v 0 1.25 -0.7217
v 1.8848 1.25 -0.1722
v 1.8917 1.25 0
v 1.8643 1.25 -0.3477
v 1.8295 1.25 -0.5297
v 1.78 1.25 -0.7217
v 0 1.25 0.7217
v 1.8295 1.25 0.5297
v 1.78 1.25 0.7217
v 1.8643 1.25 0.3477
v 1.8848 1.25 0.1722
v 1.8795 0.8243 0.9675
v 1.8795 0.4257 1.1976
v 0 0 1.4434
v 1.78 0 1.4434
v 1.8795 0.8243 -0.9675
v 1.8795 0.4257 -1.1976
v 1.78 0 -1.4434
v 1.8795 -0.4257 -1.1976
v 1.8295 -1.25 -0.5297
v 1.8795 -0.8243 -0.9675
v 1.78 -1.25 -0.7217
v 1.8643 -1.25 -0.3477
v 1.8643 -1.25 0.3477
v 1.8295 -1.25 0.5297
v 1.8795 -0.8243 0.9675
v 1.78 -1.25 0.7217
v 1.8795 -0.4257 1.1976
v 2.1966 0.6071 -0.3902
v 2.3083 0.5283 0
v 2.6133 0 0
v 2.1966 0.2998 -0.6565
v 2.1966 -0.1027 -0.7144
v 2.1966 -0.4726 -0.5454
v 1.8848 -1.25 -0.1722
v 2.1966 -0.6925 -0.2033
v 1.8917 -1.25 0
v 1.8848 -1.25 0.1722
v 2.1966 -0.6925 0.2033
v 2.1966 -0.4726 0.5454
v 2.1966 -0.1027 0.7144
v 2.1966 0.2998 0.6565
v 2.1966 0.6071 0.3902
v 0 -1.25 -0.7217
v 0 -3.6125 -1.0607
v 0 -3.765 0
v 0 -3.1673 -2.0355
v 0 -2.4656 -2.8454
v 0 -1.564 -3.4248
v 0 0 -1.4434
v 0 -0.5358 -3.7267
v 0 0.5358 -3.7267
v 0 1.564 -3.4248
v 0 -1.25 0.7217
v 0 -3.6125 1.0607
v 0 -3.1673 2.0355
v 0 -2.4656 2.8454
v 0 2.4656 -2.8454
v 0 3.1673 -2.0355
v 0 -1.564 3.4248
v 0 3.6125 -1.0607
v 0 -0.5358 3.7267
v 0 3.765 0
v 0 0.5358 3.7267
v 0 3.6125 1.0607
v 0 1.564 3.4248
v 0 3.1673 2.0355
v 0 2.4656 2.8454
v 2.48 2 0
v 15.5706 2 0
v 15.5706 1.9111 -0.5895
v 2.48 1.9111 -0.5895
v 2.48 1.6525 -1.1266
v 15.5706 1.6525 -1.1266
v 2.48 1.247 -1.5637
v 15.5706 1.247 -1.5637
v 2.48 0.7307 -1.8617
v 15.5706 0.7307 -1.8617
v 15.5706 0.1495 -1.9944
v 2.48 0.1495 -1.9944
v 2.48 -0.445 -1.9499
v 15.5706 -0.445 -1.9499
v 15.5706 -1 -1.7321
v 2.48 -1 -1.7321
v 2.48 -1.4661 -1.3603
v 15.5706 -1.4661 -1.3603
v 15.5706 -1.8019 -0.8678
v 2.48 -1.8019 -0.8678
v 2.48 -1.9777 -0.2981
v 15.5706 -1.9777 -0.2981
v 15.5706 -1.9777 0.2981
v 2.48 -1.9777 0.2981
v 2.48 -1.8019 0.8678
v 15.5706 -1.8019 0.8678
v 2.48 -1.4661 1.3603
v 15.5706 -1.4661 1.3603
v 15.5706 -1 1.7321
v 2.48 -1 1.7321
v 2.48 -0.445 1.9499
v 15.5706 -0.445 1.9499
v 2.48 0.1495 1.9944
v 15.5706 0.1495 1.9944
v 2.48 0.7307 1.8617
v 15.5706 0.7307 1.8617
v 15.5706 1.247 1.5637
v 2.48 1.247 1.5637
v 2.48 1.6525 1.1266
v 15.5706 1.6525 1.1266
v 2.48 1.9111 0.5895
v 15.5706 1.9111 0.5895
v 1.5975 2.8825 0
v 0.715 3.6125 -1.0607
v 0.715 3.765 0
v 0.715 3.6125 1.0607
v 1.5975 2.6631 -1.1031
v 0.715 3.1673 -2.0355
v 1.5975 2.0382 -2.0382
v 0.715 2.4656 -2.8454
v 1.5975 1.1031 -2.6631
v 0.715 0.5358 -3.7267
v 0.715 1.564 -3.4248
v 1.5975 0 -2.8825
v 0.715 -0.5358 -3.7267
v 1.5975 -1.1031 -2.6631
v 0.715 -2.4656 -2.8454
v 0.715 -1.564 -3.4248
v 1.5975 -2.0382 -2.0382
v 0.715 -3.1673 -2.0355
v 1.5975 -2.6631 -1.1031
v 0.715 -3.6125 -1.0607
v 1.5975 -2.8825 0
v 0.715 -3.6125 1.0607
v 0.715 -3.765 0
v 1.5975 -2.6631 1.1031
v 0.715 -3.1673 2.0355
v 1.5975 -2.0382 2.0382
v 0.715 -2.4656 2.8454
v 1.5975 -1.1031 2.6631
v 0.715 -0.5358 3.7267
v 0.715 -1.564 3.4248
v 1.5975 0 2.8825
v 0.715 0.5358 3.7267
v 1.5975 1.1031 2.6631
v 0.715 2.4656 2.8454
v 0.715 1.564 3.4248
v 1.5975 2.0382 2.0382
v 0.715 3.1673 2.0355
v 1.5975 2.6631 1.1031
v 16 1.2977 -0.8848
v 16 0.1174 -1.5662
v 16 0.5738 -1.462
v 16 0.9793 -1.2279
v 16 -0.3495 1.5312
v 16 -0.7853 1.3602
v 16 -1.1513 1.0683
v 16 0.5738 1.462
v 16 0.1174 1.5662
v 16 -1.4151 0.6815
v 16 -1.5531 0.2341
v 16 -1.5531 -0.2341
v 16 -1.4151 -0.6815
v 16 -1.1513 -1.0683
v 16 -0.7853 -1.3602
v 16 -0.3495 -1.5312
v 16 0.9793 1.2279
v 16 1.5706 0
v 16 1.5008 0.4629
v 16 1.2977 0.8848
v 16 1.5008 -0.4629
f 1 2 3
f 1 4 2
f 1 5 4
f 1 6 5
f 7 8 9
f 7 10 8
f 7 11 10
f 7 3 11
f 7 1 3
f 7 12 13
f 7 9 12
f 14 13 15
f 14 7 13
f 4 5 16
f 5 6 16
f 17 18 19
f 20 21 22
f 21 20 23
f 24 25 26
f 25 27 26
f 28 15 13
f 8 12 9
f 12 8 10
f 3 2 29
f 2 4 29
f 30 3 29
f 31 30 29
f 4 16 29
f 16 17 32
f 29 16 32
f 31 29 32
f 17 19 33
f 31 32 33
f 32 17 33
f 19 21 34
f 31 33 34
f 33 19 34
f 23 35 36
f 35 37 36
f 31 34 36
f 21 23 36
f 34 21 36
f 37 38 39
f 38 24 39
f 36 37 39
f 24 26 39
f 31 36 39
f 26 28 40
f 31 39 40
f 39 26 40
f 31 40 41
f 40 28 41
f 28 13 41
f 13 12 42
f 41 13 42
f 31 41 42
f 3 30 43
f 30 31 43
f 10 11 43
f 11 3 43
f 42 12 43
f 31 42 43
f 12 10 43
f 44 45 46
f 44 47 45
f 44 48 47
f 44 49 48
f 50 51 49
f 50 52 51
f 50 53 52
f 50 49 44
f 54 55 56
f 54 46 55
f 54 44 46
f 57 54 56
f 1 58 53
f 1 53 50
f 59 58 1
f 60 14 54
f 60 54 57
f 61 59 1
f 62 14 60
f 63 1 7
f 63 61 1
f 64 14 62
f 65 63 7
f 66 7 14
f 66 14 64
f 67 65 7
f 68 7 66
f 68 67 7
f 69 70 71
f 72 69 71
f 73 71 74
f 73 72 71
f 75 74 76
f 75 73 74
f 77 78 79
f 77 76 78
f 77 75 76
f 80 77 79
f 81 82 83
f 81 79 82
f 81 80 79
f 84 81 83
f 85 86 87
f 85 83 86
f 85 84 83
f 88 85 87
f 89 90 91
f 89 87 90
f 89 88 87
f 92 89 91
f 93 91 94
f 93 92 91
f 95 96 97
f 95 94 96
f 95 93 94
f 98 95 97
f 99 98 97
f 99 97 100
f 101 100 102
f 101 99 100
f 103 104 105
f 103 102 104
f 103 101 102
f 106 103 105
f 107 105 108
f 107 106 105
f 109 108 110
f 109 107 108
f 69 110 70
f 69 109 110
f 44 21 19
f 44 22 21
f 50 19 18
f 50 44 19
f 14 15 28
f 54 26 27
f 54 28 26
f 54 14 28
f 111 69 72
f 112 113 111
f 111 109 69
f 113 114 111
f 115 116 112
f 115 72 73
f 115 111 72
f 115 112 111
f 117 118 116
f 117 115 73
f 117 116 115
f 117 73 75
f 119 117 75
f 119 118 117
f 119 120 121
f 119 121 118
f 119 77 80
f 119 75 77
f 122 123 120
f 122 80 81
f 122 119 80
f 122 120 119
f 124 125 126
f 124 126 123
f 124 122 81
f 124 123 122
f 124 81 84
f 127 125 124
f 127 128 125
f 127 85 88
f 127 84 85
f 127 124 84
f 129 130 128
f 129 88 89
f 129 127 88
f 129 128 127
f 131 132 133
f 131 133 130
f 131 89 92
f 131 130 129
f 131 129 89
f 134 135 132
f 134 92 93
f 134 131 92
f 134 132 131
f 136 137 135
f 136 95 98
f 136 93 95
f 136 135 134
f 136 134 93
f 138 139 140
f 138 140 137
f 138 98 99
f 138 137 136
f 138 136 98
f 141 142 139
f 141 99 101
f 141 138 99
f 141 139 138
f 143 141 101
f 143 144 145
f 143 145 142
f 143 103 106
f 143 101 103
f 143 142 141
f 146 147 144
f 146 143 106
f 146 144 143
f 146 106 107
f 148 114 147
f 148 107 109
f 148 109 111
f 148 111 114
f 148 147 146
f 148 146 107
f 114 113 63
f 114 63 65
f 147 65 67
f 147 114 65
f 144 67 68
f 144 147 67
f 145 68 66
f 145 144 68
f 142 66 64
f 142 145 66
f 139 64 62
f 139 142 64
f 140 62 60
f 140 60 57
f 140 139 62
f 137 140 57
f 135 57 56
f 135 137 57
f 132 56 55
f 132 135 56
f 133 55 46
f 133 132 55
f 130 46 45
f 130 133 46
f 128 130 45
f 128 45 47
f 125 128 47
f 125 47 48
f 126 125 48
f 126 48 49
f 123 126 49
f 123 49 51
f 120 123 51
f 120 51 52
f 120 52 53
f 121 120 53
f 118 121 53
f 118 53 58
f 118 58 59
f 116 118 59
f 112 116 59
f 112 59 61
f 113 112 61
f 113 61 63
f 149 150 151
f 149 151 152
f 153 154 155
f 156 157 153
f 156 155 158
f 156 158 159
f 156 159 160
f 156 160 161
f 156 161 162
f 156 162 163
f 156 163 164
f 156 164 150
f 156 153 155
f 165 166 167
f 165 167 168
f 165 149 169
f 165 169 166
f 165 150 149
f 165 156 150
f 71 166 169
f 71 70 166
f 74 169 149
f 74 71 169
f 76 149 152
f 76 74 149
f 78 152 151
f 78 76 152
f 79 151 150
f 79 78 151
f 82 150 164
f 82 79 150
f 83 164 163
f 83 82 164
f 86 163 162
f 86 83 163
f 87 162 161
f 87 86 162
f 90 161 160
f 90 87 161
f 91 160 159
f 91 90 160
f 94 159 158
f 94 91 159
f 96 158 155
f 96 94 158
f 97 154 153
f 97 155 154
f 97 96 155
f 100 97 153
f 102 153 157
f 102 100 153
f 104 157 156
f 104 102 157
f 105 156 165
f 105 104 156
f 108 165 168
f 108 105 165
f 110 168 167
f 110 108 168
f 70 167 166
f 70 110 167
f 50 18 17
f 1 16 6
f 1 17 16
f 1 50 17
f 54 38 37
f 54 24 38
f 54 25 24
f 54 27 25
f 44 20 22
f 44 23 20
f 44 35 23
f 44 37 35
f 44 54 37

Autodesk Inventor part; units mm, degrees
ref_plane "YZ Plane" through (0, 0, 0) normal (1, 0, 0) x (0, 1, 0)
ref_plane "XZ Plane" through (0, 0, 0) normal (0, 1, 0) x (-1, 0, 0)
sketch "Sketch1" plane through (0, 0, 0) normal (0, 0, 1) x (1, 0, 0)
  line L0 (16, 0) -> (16, 2)
  line L1 (16, 2) -> (5, 2)
  line L2 (5, 2) -> (4.5706, 2)
  line L3 (0, 3.765) -> (0, 1.4434)
  line L4 (0, 1.4434) -> (1.78, 1.4434)
  line L5 (1.78, 1.4434) -> (2.6133, 0)
  line L6 (2.6133, 0) -> (16, 0)
  line L7 (0, 3.765) -> (0.715, 3.765)
  line L8 (0.715, 3.765) -> (2.48, 2)
  line L9 (4.5706, 2) -> (2.48, 2)
  line L10 (5, 2) -> (2.48, 2) construction
  line L11 (2.48, 2) -> (2.48, 2)
  line L12 (-3.2, 0) -> (19.2, 0) projected
  line L13 (0, -0.753) -> (0, 4.518) projected
  dimension "d0" = 16
  dimension "d1" = 11
  dimension "d2" = 1.78
  dimension "d3" = 4
  dimension "d6" = 2.48
  dimension "d7" = 45
  dimension "d8" = 2.8868
  dimension "d9" = 60
  dimension "d10" = 7.53
  dimension "d11" = 4
  dimension "d12" = 0.4294
revolve "Body" add sketch "Sketch1" angle 360 about axis through (2.6133, 0, 0) along (1, 0, 0) contours L6 L5 L4 L3 L7 L8 L9 L2 L1 L0
sketch "Sketch2" plane through (0, 0, 0) normal (-1, 0, 0) x (0, 0, 1)
  circle A0 centre (0, 0) radius 1.4434 projected
  line L0 (0, -5.271) -> (0, 5.271) projected
  line L1 (-5.271, 0) -> (5.271, 0) projected
  line L2 (1.4434, 0) -> (0.7217, -1.25)
  line L3 (0.7217, -1.25) -> (-0.7217, -1.25)
  line L4 (-0.7217, -1.25) -> (-1.4434, 0)
  line L5 (-1.4434, 0) -> (-0.7217, 1.25)
  line L6 (-0.7217, 1.25) -> (0.7217, 1.25)
  line L7 (0.7217, 1.25) -> (1.4434, 0)
  point P0 (0, 1.4434)
extrude "Slot" add sketch "Sketch2" against normal up to next contours L7 A0 | A0 L2 | L6 L0 A0 | A0 L0 L3 | L0 L6 A0 | A0 L3 L0 | L4 A0 | A0 L5
thread "Thread" size "M4x0.7" class "6g" standard "ISO Metric profile" length 11
chamfer "Chamfer1" distance 0.4294 distance2 0.4294 1 edges at (16, -2, 0) measured on face at (16, 0.2227, -0.5871)
ref_plane "Work Plane1" through (104.775, 0, 0) normal (0, 0, -1) x (1, 0, 0)
equation "\"d15\" = GEL"
equation "\"d17\" = -0.5 * SPD + 0.5 * GD"
equation "\"d18\" = GUL"
equation "\"d0\" = NLG"
equation "\"d1\" = GEL"
equation "\"d2\" = INTI"
equation "\"d3\" = GD"
equation "\"d6\" = KOH"
equation "\"d7\" = 0.5 * SEWI"
equation "\"d8\" = 1.1547 * SW"
equation "\"d10\" = KOD"
equation "\"d11\" = BDM"
equation "\"d12\" = GAL"
equation "\"NLG\" = 16"
equation "\"INTI\" = 1.78"
equation "\"GEL\" = 11"
equation "\"GAL\" = 0.61345 * PTC"
equation "\"KOH\" = 2.48"
equation "\"KOD\" = 7.53"
equation "\"GUL\" = 0.61345 * PTC"
equation "\"SPD\" = NND - 1.2269 * PTC"
equation "\"BDM\" = NND"
equation "\"GD\" = NND"
equation "\"SEWI\" = 90deg"
equation "\"SW\" = 2.5"
equation "\"TOA\" = 30deg"
equation "\"GD1\" = THREADDIA - 1.2269 * PTC"
equation "\"EPV\" = 4.48"
equation "\"THREADDIA\" = 4"
equation "\"PTC\" = 0.7"
equation "\"NND\" = 4"
equation "\"E0\" = 2.89"
equation "\"THREADDESC\" = 1.2345"
properties part number "ISO 10642 - M4 x  16" material "Steel"
